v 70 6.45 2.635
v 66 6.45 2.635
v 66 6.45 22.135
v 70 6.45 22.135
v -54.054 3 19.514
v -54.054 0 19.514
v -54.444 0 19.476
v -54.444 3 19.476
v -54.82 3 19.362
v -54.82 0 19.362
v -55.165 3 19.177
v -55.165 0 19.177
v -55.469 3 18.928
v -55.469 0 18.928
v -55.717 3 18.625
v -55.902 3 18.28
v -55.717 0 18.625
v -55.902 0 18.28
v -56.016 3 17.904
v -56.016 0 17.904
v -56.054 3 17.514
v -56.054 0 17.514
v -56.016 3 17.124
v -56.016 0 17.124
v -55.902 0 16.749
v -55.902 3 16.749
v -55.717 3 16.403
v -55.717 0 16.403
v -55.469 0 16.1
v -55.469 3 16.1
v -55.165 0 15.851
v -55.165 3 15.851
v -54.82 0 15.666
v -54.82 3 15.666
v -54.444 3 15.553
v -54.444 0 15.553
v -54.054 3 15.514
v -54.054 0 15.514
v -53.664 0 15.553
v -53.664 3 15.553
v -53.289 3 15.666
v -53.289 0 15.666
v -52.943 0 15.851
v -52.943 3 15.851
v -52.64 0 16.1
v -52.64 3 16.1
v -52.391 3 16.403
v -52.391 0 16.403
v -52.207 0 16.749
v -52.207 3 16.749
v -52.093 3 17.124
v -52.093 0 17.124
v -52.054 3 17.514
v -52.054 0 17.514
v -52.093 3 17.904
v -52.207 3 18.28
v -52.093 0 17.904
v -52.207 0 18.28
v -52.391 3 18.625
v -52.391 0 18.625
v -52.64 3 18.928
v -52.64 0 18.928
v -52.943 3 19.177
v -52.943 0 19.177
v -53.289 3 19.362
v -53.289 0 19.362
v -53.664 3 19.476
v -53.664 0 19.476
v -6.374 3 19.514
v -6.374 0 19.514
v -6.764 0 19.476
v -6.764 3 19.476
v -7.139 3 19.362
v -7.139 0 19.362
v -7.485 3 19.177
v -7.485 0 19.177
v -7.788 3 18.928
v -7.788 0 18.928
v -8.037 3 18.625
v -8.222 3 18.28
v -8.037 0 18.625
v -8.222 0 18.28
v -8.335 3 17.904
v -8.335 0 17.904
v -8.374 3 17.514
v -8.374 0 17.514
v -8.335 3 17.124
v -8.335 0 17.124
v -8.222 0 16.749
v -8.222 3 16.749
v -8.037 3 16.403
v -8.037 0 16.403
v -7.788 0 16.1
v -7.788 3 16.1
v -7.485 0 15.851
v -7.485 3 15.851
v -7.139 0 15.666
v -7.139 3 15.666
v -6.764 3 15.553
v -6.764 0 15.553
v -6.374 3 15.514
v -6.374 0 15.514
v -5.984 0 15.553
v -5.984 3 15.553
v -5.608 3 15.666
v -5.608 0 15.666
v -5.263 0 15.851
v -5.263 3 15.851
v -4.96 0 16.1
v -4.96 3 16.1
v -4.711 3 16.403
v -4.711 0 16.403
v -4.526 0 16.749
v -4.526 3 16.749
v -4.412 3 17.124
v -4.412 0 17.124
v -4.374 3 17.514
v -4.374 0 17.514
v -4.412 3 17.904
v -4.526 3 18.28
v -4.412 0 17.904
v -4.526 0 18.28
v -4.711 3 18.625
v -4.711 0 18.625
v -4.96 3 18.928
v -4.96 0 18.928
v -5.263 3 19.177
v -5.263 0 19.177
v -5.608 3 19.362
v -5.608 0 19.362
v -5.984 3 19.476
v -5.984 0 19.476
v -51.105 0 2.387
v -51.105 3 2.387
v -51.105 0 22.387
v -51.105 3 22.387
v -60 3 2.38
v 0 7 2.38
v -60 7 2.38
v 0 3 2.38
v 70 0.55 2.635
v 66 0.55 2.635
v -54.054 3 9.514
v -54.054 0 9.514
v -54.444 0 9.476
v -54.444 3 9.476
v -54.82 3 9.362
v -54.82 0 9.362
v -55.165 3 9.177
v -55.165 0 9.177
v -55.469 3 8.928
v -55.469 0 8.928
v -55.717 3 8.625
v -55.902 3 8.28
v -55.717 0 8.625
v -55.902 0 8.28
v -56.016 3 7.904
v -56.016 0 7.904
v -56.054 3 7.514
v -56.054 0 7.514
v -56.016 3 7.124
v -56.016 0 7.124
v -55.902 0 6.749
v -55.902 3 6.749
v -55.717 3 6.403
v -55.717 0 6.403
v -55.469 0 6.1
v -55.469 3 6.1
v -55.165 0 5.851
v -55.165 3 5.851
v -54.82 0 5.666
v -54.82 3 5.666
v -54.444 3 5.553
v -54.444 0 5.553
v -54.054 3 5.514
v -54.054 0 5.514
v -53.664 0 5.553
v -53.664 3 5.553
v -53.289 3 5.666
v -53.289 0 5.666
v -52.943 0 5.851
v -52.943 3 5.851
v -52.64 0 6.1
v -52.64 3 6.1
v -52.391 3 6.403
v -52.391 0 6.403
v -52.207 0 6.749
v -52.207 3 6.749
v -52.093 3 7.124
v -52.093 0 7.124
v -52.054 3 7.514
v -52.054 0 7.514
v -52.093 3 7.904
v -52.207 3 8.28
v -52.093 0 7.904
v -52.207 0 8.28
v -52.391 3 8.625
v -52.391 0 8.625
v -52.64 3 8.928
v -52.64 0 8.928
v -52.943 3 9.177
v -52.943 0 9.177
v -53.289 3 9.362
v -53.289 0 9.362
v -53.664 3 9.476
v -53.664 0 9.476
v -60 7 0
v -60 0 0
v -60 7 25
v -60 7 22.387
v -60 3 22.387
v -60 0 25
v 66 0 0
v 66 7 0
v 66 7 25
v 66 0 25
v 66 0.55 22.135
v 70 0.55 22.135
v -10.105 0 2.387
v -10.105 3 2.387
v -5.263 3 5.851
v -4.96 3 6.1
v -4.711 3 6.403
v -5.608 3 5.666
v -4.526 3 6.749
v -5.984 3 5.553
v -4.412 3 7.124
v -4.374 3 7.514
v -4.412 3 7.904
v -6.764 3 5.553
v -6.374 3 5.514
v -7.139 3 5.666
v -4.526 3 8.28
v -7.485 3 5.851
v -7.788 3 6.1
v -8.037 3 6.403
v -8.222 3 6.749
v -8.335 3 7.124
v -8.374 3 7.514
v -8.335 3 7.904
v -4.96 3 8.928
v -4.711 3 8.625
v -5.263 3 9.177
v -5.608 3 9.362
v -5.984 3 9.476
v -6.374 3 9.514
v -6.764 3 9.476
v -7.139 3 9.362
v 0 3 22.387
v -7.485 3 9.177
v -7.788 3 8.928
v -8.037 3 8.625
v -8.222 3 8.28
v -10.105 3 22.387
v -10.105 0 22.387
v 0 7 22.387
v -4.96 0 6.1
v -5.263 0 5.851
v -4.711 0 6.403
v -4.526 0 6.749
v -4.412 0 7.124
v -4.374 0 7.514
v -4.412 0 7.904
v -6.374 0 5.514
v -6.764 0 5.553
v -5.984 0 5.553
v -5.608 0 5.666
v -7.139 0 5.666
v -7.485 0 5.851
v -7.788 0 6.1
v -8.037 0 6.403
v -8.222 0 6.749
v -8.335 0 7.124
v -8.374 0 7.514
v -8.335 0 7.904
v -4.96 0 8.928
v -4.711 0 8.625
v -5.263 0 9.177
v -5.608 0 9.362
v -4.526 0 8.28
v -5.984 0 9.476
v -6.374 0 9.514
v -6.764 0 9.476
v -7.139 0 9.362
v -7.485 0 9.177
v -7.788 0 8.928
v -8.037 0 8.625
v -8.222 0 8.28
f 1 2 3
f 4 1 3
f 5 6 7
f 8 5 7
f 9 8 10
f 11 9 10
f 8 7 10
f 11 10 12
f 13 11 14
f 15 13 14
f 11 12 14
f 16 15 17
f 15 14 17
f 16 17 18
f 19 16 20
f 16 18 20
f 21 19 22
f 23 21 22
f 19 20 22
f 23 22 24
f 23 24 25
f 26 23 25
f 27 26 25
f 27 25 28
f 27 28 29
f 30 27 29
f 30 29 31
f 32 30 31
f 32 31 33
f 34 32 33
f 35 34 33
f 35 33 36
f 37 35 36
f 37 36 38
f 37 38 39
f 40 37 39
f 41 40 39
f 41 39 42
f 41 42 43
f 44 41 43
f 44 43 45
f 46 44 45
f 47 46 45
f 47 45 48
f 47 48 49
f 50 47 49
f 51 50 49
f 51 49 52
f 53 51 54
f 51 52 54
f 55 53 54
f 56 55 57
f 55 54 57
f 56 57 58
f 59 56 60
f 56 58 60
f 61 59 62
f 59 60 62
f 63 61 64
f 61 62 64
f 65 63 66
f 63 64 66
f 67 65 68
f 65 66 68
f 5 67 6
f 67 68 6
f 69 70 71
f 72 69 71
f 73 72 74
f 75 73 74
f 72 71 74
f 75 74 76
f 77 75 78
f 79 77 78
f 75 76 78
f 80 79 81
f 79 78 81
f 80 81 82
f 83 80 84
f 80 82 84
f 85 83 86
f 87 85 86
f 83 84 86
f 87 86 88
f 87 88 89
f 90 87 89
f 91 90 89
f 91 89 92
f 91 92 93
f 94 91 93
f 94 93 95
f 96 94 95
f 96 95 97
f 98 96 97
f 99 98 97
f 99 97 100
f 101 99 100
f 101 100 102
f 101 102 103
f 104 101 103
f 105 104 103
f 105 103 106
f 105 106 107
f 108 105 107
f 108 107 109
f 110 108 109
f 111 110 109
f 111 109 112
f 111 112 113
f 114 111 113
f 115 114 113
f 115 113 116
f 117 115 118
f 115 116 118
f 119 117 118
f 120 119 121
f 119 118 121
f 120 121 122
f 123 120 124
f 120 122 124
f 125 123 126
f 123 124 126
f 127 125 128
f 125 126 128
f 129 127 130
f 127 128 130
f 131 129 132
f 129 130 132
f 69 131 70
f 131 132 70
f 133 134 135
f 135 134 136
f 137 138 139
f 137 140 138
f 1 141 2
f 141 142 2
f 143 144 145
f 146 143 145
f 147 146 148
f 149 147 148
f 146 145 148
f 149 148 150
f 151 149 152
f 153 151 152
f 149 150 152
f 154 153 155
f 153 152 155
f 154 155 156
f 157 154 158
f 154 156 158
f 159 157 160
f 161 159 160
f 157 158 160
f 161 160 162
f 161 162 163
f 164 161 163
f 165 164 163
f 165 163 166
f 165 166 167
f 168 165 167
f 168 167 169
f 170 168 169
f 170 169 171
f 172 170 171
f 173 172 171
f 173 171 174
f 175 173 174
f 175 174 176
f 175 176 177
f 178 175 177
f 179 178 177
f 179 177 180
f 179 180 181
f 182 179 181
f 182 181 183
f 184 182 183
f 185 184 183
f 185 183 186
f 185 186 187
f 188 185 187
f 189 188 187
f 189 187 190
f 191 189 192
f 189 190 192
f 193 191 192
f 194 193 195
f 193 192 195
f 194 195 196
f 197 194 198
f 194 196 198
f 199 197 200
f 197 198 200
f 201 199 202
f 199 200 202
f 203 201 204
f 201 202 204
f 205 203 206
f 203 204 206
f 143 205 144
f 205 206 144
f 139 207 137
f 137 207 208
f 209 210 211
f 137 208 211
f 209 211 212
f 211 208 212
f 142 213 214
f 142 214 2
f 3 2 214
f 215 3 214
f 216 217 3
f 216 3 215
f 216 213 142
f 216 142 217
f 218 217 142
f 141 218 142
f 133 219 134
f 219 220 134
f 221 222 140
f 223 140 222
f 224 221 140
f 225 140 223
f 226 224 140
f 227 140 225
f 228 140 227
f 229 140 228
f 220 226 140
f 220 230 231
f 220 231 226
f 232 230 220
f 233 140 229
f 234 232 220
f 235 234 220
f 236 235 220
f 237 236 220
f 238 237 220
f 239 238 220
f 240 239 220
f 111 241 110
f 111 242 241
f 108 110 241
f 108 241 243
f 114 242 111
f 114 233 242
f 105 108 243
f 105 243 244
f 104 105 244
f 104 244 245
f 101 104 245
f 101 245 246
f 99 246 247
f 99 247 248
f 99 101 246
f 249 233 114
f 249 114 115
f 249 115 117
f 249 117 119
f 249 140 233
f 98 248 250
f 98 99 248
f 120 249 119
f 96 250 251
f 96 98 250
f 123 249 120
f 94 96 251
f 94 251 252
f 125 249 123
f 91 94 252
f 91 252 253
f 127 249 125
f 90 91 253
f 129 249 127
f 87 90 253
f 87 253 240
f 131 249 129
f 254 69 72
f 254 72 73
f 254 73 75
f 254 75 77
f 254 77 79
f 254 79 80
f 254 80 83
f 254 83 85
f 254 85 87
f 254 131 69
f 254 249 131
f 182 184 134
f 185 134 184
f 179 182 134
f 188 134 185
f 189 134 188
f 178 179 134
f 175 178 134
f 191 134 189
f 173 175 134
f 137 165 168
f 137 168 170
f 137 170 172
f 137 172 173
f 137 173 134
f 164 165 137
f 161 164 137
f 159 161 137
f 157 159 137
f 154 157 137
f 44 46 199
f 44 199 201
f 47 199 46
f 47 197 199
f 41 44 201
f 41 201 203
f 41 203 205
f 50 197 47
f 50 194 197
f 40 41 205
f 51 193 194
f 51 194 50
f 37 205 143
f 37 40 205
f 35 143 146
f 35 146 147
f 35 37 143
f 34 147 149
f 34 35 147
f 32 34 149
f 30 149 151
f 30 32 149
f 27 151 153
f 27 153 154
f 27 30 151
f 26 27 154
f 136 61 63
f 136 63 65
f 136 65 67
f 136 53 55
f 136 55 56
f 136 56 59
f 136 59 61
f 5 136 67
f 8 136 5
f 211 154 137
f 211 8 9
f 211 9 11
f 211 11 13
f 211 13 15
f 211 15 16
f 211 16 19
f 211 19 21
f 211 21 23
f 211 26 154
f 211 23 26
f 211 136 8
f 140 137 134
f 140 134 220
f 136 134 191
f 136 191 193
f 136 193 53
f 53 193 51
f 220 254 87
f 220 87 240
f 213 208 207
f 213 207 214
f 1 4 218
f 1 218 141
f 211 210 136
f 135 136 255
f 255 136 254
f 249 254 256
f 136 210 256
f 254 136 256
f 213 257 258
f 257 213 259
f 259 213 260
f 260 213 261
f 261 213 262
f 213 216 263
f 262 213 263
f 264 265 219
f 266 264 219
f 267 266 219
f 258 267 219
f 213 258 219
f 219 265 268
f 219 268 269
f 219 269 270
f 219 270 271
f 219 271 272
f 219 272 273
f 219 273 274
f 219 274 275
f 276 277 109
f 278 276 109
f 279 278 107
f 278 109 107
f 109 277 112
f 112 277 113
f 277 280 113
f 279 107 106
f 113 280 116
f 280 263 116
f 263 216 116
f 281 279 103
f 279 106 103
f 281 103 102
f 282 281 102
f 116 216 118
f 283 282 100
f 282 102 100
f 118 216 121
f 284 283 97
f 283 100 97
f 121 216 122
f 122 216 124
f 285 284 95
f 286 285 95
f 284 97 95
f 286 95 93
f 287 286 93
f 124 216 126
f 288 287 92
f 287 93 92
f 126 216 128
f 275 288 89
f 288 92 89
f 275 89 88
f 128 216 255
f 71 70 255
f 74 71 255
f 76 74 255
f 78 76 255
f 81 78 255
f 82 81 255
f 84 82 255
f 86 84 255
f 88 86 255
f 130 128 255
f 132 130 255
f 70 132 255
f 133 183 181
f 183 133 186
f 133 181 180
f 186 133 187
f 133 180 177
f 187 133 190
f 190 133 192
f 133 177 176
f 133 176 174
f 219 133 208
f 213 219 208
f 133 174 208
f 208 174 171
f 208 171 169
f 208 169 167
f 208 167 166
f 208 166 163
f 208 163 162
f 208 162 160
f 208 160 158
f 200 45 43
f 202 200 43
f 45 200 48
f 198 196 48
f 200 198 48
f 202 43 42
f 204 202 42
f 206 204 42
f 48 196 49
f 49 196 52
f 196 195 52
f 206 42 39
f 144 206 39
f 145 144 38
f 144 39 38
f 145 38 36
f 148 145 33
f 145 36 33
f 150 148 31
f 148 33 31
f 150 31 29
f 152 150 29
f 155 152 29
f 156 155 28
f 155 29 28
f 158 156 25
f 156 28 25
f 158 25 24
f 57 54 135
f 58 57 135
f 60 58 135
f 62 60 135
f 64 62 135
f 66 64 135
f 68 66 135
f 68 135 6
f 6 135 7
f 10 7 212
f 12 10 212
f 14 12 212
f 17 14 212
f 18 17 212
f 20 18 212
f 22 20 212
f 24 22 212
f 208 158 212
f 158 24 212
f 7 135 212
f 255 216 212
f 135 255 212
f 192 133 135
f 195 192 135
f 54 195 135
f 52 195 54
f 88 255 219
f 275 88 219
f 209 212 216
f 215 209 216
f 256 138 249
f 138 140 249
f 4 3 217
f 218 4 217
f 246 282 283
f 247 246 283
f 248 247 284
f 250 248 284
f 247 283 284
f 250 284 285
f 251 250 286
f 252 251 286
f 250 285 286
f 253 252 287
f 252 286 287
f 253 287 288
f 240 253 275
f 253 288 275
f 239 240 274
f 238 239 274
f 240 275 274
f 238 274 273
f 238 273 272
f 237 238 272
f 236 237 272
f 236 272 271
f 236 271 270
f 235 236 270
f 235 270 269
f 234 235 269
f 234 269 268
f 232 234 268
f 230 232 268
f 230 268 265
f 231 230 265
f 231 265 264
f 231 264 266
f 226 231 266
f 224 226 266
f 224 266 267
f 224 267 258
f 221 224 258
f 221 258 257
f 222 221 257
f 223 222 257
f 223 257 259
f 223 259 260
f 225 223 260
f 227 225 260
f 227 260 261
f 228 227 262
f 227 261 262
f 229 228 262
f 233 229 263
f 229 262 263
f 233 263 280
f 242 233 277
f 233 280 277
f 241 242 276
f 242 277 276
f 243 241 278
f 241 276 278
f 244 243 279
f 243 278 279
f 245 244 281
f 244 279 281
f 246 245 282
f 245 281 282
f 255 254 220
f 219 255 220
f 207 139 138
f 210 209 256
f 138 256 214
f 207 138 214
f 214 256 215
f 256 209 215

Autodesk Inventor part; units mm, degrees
ref_plane "YZ Plane" through (0, 0, 0) normal (1, 0, 0) x (0, 1, 0)
ref_plane "XZ Plane" through (0, 0, 0) normal (0, 1, 0) x (-1, 0, 0)
ref_plane "XY Plane" through (0, 0, 0) normal (0, 0, 1) x (1, 0, 0)
sketch "Sketch2" plane through (0, 0, 0) normal (0, 1, 0) x (-1, 0, 0)
  line L0 (0, 0) -> (60, 0)
  line L1 (60, 0) -> (60, 25)
  line L2 (60, 25) -> (0, 25)
  line L3 (0, 25) -> (0, 0)
  dimension "d2" = 25
  dimension "d3" = 60
extrude "Extrusion1" add sketch "Sketch2" along normal blind 3
sketch "Sketch4" plane through (0, 3, 0) normal (0, 1, 0) x (1, 0, 0)
  line L0 (-60, 0) -> (-60, -25) construction
  line L1 (-60, -12.5) -> (-56, -12.5) construction
  circle A0 centre (-54.0543, -17.5142) radius 2
  circle A1 centre (-54.0543, -7.5142) radius 2
  line L2 (-60, -25) -> (0, -25) projected
  line L3 (0, 0) -> (-60, 0) projected
  circle A2 centre (-6.3738, -17.5142) radius 2
  circle A3 centre (-6.3738, -7.5142) radius 2
  line L4 (-50, -21) -> (-9.77, -21)
  line L5 (-9.77, -21) -> (-9.77, -4)
  line L6 (-9.77, -4) -> (-50, -4)
  line L7 (-50, -4) -> (-50, -21)
  line L8 (-54.0543, -17.5142) -> (-51.0543, -17.5142)
  line L9 (-54.0543, -7.5142) -> (-51.0543, -7.5142)
  line L10 (-6.3738, -17.5142) -> (-9.3738, -17.5142)
  line L11 (-6.3738, -7.5142) -> (-9.3738, -7.5142)
  dimension "d8" = 4
  dimension "d9" = 4
  dimension "d11" = 40.23
  dimension "d12" = 3
  dimension "d13" = 3
  dimension "d14" = 3
  dimension "d15" = 3
hole "Hole1" at (-54.0543, 3, 17.5142) at (-54.0543, 3, 7.5142) at (-6.3738, 3, 17.5142) at (-6.3738, 3, 7.5142) direction (0, -1, 0) diameter 4 depth 8 tip angle 118
sketch "Sketch8" plane through (0, 3, 0) normal (0, 1, 0) x (1, 0, 0)
  circle A0 centre (-54.0543, -17.5142) radius 2 projected
  line L0 (-54.0543, -17.5142) -> (-51.0543, -17.5142)
  circle A1 centre (-54.0543, -7.5142) radius 2 projected
  line L1 (-54.0543, -7.5142) -> (-51.0543, -7.5142)
  circle A2 centre (-6.3738, -17.5142) radius 2 projected
  line L2 (-6.3738, -17.5142) -> (-9.3738, -17.5142)
  circle A3 centre (-6.3738, -7.5142) radius 2 projected
  line L3 (-6.3738, -7.5142) -> (-9.3738, -7.5142)
  line L4 (-51.1048, -22.3867) -> (-10.1048, -22.3867)
  line L5 (-10.1048, -22.3867) -> (-10.1048, -2.3867)
  line L6 (-10.1048, -2.3867) -> (-51.1048, -2.3867)
  line L7 (-51.1048, -2.3867) -> (-51.1048, -22.3867)
  point P0 (0, 0)
  dimension "d23" = 3
  dimension "d24" = 3
  dimension "d25" = 3
  dimension "d26" = 3
  dimension "d27" = 20
  dimension "d30" = 41
extrude "Extrusion2" cut sketch "Sketch8" against normal blind 3 contours L7 L6 L5 L4
sketch "Sketch10" plane through (0, 3, 0) normal (0, 1, 0) x (1, 0, 0)
  line L0 (0, -25) -> (0, 0) projected
  line L1 (-60, -25) -> (0, -25)
  line L2 (0, -25) -> (0, -22.3867)
  line L3 (0, -22.3867) -> (-60, -22.3867)
  line L4 (-60, -22.3867) -> (-60, -25)
  line L5 (-60, 0) -> (0, 0)
  line L6 (0, 0) -> (0, -2.3796)
  line L7 (0, -2.3796) -> (-60, -2.3796)
  line L8 (-60, -2.3796) -> (-60, 0)
extrude "Extrusion3" add sketch "Sketch10" along normal blind 4 and the other way blind 3
sketch "Sketch11" plane through (0, 0, 0) normal (0, -1, 0) x (1, 0, 0)
  line L0 (0, 0) -> (66, 0)
  line L1 (0, 25) -> (66, 25)
  line L2 (66, 0) -> (66, 25)
  line L3 (0, 0) -> (0, 25)
  line L4 (0, 25) -> (0, 0) projected
  dimension "d39" = 66
extrude "Extrusion4" add sketch "Sketch11" against normal blind 7
sketch "Sketch12" plane through (66, 0, 25) normal (1, 0, 0) x (0, 0, -1)
  line L0 (0, 0) -> (0, 7) construction
  line L1 (0, 0) -> (0, 7) construction
  line L2 (0, 3.5) -> (25, 3.5) construction
  line L3 (25, 0) -> (25, 7) construction
  line L4 (2.6133, 0) -> (22.6133, 0) construction
  line L5 (12.6133, 0) -> (12.6169, 7) construction
  line L6 (22.6204, 7) -> (2.6133, 7) construction
  line L7 (2.8651, 0.55) -> (22.3651, 0.55)
  line L8 (22.3651, 0.55) -> (22.3651, 6.45)
  line L9 (22.3651, 6.45) -> (2.8651, 6.45)
  line L10 (2.8651, 6.45) -> (2.8651, 0.55)
  line L11 (12.6151, 0.55) -> (12.6151, 6.45) construction
  line L12 (2.8651, 3.5) -> (22.3651, 3.5) construction
  point P0 (12.6151, 3.5)
  dimension "d42" = 19.5
  dimension "d43" = 5.9
extrude "Extrusion5" add sketch "Sketch12" along normal blind 4
properties part number "servo_holder"
